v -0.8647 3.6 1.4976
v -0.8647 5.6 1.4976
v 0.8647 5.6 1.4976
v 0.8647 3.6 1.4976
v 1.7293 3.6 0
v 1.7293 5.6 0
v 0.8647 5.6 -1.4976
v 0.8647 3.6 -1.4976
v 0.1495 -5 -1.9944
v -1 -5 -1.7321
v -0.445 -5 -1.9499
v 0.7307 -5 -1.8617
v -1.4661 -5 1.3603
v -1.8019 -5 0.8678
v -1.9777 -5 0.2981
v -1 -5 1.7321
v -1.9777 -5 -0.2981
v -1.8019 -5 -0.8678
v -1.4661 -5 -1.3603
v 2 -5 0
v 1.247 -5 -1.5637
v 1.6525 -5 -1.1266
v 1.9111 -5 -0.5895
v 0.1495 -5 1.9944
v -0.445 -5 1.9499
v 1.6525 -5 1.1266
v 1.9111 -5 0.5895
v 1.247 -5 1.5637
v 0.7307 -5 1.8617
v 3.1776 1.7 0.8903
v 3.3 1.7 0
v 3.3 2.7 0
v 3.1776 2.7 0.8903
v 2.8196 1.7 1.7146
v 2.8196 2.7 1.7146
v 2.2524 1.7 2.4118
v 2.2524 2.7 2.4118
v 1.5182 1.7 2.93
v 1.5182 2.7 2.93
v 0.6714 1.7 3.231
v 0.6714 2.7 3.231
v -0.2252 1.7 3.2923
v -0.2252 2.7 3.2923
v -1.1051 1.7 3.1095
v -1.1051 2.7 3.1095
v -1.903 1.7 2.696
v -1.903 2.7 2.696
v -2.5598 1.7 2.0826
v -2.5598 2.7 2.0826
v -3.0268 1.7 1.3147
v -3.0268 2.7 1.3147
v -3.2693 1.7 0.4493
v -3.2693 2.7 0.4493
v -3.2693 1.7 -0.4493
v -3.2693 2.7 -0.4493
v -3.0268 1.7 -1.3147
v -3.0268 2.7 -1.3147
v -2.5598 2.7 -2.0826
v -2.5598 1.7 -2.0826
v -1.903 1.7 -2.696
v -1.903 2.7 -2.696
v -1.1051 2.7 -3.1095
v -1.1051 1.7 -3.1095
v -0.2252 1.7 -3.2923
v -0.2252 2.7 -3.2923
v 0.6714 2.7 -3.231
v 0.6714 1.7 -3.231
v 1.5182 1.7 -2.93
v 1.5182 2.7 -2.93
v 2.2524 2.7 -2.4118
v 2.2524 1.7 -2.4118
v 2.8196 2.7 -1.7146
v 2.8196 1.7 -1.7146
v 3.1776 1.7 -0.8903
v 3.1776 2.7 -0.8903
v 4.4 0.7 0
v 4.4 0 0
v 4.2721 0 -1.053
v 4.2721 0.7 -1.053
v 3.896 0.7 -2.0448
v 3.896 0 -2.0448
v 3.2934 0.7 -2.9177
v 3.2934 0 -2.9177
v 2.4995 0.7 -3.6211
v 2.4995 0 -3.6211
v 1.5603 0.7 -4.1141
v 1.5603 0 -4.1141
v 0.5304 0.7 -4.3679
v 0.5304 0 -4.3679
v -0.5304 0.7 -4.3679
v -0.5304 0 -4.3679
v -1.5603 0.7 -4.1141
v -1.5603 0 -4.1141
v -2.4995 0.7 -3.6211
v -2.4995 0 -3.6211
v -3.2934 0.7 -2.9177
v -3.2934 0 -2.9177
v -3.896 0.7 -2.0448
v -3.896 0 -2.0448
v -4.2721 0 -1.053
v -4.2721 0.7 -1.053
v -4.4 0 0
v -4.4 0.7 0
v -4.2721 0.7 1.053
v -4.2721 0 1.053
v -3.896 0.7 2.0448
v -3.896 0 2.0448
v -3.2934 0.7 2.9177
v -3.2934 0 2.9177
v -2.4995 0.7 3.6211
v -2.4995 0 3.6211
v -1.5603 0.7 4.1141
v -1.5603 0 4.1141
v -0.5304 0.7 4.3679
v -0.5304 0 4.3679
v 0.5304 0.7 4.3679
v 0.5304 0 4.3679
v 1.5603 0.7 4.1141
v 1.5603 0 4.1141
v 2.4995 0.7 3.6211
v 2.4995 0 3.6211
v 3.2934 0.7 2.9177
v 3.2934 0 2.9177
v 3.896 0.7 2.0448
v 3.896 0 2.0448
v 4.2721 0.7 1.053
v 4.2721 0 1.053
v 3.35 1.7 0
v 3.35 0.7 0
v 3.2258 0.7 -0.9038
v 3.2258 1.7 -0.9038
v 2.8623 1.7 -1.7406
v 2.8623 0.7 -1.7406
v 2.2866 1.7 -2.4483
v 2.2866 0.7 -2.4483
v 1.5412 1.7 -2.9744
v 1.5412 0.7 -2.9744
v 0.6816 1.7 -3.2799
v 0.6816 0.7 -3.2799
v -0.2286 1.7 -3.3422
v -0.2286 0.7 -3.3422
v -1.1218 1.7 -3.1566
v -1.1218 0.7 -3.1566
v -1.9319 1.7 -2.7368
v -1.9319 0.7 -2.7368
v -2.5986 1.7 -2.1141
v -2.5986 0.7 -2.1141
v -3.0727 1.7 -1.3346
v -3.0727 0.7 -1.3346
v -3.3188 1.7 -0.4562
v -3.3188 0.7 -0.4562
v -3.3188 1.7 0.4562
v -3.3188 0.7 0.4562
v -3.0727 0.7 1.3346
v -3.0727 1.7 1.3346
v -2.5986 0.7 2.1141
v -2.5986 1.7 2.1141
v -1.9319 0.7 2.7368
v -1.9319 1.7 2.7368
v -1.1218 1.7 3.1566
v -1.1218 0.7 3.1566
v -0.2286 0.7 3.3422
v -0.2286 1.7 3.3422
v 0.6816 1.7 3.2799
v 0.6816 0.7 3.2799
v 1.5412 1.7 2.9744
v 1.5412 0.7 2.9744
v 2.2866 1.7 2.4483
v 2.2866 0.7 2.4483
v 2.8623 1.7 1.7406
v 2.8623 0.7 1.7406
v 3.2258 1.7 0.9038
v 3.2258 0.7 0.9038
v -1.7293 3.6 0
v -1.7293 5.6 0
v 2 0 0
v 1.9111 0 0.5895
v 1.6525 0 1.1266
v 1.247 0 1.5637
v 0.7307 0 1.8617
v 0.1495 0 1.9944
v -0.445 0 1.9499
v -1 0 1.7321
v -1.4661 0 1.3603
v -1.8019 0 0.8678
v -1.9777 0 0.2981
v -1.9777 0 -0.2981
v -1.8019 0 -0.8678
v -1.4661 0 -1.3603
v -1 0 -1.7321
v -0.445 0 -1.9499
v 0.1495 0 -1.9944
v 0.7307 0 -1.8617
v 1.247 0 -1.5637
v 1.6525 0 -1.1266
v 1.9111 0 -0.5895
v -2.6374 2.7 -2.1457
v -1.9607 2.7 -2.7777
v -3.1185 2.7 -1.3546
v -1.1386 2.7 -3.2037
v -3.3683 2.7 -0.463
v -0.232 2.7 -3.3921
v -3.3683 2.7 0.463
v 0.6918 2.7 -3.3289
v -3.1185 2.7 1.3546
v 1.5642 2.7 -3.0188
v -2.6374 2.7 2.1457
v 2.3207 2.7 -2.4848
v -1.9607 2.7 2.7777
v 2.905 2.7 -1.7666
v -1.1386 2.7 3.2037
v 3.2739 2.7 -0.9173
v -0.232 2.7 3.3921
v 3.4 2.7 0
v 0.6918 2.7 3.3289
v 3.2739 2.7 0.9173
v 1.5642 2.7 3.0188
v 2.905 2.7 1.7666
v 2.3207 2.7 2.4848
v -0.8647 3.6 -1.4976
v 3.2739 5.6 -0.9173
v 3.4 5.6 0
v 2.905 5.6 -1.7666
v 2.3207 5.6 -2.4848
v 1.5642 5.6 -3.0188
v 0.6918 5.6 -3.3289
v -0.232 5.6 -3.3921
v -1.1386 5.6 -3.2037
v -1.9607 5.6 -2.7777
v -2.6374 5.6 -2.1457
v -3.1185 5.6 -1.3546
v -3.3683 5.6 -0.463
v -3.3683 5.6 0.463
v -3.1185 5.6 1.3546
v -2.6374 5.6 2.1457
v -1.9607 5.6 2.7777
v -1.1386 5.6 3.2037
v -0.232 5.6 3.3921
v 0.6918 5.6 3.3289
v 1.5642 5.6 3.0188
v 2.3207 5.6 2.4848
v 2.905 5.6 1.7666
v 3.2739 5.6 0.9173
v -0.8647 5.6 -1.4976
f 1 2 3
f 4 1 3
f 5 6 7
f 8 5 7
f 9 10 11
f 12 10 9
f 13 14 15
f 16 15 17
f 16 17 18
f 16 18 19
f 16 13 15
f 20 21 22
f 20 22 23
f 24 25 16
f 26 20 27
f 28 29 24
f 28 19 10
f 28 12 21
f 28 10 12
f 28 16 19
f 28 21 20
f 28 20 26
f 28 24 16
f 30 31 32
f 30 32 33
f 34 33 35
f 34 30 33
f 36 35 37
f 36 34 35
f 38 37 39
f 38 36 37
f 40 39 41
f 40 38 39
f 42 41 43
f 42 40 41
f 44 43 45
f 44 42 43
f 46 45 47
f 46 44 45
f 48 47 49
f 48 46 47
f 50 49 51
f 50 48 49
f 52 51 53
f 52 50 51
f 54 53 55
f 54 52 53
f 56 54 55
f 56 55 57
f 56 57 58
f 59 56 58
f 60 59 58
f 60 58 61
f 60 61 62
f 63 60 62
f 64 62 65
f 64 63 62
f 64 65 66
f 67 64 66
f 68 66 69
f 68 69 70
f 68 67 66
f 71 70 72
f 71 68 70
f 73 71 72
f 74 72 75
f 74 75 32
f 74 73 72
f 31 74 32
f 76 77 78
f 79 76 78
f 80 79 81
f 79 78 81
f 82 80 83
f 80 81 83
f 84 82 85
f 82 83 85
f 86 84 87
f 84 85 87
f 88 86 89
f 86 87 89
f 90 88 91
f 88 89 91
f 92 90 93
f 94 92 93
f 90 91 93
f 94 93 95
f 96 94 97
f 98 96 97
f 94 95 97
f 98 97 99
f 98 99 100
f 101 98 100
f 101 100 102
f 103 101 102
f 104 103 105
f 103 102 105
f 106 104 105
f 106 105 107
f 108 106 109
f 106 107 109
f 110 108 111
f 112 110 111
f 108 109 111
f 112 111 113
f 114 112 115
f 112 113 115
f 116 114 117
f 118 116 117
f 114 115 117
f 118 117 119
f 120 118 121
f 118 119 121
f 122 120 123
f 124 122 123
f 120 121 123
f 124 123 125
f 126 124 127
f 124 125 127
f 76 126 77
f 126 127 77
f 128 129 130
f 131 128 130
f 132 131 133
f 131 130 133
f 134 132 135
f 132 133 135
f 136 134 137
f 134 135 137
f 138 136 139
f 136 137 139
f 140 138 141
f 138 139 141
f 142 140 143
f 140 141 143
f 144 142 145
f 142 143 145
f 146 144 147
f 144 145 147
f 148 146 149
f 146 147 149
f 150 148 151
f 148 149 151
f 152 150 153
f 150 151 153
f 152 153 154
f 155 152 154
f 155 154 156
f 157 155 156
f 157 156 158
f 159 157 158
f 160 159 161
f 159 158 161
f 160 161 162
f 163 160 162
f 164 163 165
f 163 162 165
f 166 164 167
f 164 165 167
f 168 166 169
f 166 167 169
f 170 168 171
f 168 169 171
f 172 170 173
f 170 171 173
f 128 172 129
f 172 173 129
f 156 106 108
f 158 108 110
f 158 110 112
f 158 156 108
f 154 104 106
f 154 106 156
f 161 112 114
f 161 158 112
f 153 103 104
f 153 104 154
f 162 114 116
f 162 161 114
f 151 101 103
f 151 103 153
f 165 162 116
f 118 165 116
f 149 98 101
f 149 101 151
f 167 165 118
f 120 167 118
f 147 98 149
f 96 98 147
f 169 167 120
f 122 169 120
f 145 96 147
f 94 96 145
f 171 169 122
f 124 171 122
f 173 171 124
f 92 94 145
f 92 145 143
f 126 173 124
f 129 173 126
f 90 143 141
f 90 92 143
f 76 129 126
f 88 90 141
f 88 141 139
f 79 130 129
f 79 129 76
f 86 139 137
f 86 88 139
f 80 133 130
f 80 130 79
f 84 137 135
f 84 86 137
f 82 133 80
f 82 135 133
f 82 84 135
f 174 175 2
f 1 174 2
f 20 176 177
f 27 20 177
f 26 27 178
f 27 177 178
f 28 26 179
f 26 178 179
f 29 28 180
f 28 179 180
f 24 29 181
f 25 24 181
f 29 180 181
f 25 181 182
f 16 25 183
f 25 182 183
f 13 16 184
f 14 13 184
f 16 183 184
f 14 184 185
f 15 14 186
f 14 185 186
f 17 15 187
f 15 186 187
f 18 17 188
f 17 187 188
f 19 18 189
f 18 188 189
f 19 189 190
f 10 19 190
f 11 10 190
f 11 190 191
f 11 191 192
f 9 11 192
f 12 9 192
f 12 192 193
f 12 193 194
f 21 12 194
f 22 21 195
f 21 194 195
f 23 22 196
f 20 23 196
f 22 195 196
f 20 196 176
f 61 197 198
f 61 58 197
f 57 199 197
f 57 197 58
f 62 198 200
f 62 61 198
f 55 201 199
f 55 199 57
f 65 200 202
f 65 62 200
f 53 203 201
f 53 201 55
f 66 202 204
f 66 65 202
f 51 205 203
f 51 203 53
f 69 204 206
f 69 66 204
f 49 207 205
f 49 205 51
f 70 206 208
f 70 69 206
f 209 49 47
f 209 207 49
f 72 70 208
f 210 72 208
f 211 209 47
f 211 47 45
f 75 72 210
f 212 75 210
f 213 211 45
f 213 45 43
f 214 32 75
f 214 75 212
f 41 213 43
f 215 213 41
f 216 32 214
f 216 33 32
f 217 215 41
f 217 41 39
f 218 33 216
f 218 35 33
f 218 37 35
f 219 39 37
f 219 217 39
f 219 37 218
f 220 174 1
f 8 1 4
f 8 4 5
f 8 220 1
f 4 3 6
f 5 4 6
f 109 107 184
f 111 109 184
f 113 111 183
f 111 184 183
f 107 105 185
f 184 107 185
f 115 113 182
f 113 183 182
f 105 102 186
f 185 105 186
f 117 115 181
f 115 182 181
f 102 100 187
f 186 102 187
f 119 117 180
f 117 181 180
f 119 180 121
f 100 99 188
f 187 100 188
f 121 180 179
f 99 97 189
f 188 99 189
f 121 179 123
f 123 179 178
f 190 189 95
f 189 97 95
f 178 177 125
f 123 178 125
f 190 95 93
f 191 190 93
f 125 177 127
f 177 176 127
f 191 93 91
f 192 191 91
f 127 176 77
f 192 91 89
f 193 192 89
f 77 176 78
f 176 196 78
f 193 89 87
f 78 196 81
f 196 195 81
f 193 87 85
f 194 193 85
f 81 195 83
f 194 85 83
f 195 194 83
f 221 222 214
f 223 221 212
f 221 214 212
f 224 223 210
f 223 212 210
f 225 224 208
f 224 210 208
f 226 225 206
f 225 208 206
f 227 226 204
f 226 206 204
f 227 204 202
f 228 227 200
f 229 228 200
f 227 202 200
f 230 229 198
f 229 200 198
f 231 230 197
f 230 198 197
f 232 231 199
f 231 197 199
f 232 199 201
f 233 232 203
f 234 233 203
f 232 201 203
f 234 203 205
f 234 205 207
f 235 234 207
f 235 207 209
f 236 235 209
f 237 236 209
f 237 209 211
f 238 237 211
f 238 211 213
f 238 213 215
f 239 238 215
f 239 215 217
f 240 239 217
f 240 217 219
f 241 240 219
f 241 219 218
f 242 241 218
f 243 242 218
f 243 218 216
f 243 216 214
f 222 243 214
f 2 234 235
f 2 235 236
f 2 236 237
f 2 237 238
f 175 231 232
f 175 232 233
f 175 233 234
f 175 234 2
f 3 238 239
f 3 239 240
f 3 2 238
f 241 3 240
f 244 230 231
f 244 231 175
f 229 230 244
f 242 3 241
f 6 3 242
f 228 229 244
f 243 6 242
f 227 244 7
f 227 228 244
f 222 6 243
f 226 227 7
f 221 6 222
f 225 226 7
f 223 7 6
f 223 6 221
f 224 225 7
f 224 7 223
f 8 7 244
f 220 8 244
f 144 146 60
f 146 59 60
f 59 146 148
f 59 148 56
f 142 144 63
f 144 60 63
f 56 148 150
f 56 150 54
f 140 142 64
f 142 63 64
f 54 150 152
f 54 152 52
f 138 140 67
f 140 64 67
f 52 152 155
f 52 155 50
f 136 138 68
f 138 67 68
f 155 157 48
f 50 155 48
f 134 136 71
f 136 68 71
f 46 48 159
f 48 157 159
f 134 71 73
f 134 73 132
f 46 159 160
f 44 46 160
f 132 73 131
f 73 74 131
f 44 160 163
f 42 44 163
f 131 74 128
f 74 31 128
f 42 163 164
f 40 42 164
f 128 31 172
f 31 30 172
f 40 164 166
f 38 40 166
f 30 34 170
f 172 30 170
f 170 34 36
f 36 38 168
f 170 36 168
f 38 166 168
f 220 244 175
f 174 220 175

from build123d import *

# Parameters (mm, degrees)
SKETCH_1_R          = 4.4
EXTRUDE_1_DEPTH     = 0.7
SKETCH_2_R          = 3.35
EXTRUDE_2_DEPTH     = 1
SKETCH_3_R          = 3.4
EXTRUDE_3_DEPTH     = 3.9
SKETCH_4_R          = 10.526345736
SKETCH_4_R_2        = 3.3
CUT_EXTRUDE_1_DEPTH = 1
CUT_EXTRUDE_2_DEPTH = 2
SKETCH_6_R          = 2
EXTRUDE_4_DEPTH     = 5


with BuildPart() as part:
    # 草图1 → 凸台-拉伸1 (new body)
    with BuildSketch(Plane(origin=(0, 0, 0), x_dir=(1, 0, 0), z_dir=(0, 1, 0))):
        Circle(SKETCH_1_R)
    extrude(amount=EXTRUDE_1_DEPTH)

    # 草图2 → 凸台-拉伸2 (add)
    with BuildSketch(Plane(origin=(0, 0.7, 0), x_dir=(1, 0, 0), z_dir=(0, 1, 0))):
        Circle(SKETCH_2_R)
    extrude(amount=EXTRUDE_2_DEPTH)

    # 草图3 → 凸台-拉伸3 (add)
    with BuildSketch(Plane(origin=(0, 1.7, 0), x_dir=(1, 0, 0), z_dir=(0, 1, 0))):
        Circle(SKETCH_3_R)
    extrude(amount=EXTRUDE_3_DEPTH)

    # 草图4 → 切除-拉伸1 (cut)
    with BuildSketch(Plane.XZ.offset(-1.7)):
        Circle(SKETCH_4_R)
        Circle(SKETCH_4_R_2, mode=Mode.SUBTRACT)
    extrude(amount=-CUT_EXTRUDE_1_DEPTH, mode=Mode.SUBTRACT)

    # 草图5 → 切除-拉伸2 (cut)
    with BuildSketch(Plane(origin=(0, 5.6, 0), x_dir=(1, 0, 0), z_dir=(0, 1, 0))):
        Polygon((-1.729316128, 0), (-0.864658064, -1.497631698), (0.864658064, -1.497631698), (1.729316128, 0), (0.864658064, 1.497631698), (-0.864658064, 1.497631698), align=None)
    extrude(amount=-CUT_EXTRUDE_2_DEPTH, mode=Mode.SUBTRACT)

    # 草图6 → 凸台-拉伸4 (add)
    with BuildSketch(Plane.XZ):
        Circle(SKETCH_6_R)
    extrude(amount=EXTRUDE_4_DEPTH)


solid = part.part
